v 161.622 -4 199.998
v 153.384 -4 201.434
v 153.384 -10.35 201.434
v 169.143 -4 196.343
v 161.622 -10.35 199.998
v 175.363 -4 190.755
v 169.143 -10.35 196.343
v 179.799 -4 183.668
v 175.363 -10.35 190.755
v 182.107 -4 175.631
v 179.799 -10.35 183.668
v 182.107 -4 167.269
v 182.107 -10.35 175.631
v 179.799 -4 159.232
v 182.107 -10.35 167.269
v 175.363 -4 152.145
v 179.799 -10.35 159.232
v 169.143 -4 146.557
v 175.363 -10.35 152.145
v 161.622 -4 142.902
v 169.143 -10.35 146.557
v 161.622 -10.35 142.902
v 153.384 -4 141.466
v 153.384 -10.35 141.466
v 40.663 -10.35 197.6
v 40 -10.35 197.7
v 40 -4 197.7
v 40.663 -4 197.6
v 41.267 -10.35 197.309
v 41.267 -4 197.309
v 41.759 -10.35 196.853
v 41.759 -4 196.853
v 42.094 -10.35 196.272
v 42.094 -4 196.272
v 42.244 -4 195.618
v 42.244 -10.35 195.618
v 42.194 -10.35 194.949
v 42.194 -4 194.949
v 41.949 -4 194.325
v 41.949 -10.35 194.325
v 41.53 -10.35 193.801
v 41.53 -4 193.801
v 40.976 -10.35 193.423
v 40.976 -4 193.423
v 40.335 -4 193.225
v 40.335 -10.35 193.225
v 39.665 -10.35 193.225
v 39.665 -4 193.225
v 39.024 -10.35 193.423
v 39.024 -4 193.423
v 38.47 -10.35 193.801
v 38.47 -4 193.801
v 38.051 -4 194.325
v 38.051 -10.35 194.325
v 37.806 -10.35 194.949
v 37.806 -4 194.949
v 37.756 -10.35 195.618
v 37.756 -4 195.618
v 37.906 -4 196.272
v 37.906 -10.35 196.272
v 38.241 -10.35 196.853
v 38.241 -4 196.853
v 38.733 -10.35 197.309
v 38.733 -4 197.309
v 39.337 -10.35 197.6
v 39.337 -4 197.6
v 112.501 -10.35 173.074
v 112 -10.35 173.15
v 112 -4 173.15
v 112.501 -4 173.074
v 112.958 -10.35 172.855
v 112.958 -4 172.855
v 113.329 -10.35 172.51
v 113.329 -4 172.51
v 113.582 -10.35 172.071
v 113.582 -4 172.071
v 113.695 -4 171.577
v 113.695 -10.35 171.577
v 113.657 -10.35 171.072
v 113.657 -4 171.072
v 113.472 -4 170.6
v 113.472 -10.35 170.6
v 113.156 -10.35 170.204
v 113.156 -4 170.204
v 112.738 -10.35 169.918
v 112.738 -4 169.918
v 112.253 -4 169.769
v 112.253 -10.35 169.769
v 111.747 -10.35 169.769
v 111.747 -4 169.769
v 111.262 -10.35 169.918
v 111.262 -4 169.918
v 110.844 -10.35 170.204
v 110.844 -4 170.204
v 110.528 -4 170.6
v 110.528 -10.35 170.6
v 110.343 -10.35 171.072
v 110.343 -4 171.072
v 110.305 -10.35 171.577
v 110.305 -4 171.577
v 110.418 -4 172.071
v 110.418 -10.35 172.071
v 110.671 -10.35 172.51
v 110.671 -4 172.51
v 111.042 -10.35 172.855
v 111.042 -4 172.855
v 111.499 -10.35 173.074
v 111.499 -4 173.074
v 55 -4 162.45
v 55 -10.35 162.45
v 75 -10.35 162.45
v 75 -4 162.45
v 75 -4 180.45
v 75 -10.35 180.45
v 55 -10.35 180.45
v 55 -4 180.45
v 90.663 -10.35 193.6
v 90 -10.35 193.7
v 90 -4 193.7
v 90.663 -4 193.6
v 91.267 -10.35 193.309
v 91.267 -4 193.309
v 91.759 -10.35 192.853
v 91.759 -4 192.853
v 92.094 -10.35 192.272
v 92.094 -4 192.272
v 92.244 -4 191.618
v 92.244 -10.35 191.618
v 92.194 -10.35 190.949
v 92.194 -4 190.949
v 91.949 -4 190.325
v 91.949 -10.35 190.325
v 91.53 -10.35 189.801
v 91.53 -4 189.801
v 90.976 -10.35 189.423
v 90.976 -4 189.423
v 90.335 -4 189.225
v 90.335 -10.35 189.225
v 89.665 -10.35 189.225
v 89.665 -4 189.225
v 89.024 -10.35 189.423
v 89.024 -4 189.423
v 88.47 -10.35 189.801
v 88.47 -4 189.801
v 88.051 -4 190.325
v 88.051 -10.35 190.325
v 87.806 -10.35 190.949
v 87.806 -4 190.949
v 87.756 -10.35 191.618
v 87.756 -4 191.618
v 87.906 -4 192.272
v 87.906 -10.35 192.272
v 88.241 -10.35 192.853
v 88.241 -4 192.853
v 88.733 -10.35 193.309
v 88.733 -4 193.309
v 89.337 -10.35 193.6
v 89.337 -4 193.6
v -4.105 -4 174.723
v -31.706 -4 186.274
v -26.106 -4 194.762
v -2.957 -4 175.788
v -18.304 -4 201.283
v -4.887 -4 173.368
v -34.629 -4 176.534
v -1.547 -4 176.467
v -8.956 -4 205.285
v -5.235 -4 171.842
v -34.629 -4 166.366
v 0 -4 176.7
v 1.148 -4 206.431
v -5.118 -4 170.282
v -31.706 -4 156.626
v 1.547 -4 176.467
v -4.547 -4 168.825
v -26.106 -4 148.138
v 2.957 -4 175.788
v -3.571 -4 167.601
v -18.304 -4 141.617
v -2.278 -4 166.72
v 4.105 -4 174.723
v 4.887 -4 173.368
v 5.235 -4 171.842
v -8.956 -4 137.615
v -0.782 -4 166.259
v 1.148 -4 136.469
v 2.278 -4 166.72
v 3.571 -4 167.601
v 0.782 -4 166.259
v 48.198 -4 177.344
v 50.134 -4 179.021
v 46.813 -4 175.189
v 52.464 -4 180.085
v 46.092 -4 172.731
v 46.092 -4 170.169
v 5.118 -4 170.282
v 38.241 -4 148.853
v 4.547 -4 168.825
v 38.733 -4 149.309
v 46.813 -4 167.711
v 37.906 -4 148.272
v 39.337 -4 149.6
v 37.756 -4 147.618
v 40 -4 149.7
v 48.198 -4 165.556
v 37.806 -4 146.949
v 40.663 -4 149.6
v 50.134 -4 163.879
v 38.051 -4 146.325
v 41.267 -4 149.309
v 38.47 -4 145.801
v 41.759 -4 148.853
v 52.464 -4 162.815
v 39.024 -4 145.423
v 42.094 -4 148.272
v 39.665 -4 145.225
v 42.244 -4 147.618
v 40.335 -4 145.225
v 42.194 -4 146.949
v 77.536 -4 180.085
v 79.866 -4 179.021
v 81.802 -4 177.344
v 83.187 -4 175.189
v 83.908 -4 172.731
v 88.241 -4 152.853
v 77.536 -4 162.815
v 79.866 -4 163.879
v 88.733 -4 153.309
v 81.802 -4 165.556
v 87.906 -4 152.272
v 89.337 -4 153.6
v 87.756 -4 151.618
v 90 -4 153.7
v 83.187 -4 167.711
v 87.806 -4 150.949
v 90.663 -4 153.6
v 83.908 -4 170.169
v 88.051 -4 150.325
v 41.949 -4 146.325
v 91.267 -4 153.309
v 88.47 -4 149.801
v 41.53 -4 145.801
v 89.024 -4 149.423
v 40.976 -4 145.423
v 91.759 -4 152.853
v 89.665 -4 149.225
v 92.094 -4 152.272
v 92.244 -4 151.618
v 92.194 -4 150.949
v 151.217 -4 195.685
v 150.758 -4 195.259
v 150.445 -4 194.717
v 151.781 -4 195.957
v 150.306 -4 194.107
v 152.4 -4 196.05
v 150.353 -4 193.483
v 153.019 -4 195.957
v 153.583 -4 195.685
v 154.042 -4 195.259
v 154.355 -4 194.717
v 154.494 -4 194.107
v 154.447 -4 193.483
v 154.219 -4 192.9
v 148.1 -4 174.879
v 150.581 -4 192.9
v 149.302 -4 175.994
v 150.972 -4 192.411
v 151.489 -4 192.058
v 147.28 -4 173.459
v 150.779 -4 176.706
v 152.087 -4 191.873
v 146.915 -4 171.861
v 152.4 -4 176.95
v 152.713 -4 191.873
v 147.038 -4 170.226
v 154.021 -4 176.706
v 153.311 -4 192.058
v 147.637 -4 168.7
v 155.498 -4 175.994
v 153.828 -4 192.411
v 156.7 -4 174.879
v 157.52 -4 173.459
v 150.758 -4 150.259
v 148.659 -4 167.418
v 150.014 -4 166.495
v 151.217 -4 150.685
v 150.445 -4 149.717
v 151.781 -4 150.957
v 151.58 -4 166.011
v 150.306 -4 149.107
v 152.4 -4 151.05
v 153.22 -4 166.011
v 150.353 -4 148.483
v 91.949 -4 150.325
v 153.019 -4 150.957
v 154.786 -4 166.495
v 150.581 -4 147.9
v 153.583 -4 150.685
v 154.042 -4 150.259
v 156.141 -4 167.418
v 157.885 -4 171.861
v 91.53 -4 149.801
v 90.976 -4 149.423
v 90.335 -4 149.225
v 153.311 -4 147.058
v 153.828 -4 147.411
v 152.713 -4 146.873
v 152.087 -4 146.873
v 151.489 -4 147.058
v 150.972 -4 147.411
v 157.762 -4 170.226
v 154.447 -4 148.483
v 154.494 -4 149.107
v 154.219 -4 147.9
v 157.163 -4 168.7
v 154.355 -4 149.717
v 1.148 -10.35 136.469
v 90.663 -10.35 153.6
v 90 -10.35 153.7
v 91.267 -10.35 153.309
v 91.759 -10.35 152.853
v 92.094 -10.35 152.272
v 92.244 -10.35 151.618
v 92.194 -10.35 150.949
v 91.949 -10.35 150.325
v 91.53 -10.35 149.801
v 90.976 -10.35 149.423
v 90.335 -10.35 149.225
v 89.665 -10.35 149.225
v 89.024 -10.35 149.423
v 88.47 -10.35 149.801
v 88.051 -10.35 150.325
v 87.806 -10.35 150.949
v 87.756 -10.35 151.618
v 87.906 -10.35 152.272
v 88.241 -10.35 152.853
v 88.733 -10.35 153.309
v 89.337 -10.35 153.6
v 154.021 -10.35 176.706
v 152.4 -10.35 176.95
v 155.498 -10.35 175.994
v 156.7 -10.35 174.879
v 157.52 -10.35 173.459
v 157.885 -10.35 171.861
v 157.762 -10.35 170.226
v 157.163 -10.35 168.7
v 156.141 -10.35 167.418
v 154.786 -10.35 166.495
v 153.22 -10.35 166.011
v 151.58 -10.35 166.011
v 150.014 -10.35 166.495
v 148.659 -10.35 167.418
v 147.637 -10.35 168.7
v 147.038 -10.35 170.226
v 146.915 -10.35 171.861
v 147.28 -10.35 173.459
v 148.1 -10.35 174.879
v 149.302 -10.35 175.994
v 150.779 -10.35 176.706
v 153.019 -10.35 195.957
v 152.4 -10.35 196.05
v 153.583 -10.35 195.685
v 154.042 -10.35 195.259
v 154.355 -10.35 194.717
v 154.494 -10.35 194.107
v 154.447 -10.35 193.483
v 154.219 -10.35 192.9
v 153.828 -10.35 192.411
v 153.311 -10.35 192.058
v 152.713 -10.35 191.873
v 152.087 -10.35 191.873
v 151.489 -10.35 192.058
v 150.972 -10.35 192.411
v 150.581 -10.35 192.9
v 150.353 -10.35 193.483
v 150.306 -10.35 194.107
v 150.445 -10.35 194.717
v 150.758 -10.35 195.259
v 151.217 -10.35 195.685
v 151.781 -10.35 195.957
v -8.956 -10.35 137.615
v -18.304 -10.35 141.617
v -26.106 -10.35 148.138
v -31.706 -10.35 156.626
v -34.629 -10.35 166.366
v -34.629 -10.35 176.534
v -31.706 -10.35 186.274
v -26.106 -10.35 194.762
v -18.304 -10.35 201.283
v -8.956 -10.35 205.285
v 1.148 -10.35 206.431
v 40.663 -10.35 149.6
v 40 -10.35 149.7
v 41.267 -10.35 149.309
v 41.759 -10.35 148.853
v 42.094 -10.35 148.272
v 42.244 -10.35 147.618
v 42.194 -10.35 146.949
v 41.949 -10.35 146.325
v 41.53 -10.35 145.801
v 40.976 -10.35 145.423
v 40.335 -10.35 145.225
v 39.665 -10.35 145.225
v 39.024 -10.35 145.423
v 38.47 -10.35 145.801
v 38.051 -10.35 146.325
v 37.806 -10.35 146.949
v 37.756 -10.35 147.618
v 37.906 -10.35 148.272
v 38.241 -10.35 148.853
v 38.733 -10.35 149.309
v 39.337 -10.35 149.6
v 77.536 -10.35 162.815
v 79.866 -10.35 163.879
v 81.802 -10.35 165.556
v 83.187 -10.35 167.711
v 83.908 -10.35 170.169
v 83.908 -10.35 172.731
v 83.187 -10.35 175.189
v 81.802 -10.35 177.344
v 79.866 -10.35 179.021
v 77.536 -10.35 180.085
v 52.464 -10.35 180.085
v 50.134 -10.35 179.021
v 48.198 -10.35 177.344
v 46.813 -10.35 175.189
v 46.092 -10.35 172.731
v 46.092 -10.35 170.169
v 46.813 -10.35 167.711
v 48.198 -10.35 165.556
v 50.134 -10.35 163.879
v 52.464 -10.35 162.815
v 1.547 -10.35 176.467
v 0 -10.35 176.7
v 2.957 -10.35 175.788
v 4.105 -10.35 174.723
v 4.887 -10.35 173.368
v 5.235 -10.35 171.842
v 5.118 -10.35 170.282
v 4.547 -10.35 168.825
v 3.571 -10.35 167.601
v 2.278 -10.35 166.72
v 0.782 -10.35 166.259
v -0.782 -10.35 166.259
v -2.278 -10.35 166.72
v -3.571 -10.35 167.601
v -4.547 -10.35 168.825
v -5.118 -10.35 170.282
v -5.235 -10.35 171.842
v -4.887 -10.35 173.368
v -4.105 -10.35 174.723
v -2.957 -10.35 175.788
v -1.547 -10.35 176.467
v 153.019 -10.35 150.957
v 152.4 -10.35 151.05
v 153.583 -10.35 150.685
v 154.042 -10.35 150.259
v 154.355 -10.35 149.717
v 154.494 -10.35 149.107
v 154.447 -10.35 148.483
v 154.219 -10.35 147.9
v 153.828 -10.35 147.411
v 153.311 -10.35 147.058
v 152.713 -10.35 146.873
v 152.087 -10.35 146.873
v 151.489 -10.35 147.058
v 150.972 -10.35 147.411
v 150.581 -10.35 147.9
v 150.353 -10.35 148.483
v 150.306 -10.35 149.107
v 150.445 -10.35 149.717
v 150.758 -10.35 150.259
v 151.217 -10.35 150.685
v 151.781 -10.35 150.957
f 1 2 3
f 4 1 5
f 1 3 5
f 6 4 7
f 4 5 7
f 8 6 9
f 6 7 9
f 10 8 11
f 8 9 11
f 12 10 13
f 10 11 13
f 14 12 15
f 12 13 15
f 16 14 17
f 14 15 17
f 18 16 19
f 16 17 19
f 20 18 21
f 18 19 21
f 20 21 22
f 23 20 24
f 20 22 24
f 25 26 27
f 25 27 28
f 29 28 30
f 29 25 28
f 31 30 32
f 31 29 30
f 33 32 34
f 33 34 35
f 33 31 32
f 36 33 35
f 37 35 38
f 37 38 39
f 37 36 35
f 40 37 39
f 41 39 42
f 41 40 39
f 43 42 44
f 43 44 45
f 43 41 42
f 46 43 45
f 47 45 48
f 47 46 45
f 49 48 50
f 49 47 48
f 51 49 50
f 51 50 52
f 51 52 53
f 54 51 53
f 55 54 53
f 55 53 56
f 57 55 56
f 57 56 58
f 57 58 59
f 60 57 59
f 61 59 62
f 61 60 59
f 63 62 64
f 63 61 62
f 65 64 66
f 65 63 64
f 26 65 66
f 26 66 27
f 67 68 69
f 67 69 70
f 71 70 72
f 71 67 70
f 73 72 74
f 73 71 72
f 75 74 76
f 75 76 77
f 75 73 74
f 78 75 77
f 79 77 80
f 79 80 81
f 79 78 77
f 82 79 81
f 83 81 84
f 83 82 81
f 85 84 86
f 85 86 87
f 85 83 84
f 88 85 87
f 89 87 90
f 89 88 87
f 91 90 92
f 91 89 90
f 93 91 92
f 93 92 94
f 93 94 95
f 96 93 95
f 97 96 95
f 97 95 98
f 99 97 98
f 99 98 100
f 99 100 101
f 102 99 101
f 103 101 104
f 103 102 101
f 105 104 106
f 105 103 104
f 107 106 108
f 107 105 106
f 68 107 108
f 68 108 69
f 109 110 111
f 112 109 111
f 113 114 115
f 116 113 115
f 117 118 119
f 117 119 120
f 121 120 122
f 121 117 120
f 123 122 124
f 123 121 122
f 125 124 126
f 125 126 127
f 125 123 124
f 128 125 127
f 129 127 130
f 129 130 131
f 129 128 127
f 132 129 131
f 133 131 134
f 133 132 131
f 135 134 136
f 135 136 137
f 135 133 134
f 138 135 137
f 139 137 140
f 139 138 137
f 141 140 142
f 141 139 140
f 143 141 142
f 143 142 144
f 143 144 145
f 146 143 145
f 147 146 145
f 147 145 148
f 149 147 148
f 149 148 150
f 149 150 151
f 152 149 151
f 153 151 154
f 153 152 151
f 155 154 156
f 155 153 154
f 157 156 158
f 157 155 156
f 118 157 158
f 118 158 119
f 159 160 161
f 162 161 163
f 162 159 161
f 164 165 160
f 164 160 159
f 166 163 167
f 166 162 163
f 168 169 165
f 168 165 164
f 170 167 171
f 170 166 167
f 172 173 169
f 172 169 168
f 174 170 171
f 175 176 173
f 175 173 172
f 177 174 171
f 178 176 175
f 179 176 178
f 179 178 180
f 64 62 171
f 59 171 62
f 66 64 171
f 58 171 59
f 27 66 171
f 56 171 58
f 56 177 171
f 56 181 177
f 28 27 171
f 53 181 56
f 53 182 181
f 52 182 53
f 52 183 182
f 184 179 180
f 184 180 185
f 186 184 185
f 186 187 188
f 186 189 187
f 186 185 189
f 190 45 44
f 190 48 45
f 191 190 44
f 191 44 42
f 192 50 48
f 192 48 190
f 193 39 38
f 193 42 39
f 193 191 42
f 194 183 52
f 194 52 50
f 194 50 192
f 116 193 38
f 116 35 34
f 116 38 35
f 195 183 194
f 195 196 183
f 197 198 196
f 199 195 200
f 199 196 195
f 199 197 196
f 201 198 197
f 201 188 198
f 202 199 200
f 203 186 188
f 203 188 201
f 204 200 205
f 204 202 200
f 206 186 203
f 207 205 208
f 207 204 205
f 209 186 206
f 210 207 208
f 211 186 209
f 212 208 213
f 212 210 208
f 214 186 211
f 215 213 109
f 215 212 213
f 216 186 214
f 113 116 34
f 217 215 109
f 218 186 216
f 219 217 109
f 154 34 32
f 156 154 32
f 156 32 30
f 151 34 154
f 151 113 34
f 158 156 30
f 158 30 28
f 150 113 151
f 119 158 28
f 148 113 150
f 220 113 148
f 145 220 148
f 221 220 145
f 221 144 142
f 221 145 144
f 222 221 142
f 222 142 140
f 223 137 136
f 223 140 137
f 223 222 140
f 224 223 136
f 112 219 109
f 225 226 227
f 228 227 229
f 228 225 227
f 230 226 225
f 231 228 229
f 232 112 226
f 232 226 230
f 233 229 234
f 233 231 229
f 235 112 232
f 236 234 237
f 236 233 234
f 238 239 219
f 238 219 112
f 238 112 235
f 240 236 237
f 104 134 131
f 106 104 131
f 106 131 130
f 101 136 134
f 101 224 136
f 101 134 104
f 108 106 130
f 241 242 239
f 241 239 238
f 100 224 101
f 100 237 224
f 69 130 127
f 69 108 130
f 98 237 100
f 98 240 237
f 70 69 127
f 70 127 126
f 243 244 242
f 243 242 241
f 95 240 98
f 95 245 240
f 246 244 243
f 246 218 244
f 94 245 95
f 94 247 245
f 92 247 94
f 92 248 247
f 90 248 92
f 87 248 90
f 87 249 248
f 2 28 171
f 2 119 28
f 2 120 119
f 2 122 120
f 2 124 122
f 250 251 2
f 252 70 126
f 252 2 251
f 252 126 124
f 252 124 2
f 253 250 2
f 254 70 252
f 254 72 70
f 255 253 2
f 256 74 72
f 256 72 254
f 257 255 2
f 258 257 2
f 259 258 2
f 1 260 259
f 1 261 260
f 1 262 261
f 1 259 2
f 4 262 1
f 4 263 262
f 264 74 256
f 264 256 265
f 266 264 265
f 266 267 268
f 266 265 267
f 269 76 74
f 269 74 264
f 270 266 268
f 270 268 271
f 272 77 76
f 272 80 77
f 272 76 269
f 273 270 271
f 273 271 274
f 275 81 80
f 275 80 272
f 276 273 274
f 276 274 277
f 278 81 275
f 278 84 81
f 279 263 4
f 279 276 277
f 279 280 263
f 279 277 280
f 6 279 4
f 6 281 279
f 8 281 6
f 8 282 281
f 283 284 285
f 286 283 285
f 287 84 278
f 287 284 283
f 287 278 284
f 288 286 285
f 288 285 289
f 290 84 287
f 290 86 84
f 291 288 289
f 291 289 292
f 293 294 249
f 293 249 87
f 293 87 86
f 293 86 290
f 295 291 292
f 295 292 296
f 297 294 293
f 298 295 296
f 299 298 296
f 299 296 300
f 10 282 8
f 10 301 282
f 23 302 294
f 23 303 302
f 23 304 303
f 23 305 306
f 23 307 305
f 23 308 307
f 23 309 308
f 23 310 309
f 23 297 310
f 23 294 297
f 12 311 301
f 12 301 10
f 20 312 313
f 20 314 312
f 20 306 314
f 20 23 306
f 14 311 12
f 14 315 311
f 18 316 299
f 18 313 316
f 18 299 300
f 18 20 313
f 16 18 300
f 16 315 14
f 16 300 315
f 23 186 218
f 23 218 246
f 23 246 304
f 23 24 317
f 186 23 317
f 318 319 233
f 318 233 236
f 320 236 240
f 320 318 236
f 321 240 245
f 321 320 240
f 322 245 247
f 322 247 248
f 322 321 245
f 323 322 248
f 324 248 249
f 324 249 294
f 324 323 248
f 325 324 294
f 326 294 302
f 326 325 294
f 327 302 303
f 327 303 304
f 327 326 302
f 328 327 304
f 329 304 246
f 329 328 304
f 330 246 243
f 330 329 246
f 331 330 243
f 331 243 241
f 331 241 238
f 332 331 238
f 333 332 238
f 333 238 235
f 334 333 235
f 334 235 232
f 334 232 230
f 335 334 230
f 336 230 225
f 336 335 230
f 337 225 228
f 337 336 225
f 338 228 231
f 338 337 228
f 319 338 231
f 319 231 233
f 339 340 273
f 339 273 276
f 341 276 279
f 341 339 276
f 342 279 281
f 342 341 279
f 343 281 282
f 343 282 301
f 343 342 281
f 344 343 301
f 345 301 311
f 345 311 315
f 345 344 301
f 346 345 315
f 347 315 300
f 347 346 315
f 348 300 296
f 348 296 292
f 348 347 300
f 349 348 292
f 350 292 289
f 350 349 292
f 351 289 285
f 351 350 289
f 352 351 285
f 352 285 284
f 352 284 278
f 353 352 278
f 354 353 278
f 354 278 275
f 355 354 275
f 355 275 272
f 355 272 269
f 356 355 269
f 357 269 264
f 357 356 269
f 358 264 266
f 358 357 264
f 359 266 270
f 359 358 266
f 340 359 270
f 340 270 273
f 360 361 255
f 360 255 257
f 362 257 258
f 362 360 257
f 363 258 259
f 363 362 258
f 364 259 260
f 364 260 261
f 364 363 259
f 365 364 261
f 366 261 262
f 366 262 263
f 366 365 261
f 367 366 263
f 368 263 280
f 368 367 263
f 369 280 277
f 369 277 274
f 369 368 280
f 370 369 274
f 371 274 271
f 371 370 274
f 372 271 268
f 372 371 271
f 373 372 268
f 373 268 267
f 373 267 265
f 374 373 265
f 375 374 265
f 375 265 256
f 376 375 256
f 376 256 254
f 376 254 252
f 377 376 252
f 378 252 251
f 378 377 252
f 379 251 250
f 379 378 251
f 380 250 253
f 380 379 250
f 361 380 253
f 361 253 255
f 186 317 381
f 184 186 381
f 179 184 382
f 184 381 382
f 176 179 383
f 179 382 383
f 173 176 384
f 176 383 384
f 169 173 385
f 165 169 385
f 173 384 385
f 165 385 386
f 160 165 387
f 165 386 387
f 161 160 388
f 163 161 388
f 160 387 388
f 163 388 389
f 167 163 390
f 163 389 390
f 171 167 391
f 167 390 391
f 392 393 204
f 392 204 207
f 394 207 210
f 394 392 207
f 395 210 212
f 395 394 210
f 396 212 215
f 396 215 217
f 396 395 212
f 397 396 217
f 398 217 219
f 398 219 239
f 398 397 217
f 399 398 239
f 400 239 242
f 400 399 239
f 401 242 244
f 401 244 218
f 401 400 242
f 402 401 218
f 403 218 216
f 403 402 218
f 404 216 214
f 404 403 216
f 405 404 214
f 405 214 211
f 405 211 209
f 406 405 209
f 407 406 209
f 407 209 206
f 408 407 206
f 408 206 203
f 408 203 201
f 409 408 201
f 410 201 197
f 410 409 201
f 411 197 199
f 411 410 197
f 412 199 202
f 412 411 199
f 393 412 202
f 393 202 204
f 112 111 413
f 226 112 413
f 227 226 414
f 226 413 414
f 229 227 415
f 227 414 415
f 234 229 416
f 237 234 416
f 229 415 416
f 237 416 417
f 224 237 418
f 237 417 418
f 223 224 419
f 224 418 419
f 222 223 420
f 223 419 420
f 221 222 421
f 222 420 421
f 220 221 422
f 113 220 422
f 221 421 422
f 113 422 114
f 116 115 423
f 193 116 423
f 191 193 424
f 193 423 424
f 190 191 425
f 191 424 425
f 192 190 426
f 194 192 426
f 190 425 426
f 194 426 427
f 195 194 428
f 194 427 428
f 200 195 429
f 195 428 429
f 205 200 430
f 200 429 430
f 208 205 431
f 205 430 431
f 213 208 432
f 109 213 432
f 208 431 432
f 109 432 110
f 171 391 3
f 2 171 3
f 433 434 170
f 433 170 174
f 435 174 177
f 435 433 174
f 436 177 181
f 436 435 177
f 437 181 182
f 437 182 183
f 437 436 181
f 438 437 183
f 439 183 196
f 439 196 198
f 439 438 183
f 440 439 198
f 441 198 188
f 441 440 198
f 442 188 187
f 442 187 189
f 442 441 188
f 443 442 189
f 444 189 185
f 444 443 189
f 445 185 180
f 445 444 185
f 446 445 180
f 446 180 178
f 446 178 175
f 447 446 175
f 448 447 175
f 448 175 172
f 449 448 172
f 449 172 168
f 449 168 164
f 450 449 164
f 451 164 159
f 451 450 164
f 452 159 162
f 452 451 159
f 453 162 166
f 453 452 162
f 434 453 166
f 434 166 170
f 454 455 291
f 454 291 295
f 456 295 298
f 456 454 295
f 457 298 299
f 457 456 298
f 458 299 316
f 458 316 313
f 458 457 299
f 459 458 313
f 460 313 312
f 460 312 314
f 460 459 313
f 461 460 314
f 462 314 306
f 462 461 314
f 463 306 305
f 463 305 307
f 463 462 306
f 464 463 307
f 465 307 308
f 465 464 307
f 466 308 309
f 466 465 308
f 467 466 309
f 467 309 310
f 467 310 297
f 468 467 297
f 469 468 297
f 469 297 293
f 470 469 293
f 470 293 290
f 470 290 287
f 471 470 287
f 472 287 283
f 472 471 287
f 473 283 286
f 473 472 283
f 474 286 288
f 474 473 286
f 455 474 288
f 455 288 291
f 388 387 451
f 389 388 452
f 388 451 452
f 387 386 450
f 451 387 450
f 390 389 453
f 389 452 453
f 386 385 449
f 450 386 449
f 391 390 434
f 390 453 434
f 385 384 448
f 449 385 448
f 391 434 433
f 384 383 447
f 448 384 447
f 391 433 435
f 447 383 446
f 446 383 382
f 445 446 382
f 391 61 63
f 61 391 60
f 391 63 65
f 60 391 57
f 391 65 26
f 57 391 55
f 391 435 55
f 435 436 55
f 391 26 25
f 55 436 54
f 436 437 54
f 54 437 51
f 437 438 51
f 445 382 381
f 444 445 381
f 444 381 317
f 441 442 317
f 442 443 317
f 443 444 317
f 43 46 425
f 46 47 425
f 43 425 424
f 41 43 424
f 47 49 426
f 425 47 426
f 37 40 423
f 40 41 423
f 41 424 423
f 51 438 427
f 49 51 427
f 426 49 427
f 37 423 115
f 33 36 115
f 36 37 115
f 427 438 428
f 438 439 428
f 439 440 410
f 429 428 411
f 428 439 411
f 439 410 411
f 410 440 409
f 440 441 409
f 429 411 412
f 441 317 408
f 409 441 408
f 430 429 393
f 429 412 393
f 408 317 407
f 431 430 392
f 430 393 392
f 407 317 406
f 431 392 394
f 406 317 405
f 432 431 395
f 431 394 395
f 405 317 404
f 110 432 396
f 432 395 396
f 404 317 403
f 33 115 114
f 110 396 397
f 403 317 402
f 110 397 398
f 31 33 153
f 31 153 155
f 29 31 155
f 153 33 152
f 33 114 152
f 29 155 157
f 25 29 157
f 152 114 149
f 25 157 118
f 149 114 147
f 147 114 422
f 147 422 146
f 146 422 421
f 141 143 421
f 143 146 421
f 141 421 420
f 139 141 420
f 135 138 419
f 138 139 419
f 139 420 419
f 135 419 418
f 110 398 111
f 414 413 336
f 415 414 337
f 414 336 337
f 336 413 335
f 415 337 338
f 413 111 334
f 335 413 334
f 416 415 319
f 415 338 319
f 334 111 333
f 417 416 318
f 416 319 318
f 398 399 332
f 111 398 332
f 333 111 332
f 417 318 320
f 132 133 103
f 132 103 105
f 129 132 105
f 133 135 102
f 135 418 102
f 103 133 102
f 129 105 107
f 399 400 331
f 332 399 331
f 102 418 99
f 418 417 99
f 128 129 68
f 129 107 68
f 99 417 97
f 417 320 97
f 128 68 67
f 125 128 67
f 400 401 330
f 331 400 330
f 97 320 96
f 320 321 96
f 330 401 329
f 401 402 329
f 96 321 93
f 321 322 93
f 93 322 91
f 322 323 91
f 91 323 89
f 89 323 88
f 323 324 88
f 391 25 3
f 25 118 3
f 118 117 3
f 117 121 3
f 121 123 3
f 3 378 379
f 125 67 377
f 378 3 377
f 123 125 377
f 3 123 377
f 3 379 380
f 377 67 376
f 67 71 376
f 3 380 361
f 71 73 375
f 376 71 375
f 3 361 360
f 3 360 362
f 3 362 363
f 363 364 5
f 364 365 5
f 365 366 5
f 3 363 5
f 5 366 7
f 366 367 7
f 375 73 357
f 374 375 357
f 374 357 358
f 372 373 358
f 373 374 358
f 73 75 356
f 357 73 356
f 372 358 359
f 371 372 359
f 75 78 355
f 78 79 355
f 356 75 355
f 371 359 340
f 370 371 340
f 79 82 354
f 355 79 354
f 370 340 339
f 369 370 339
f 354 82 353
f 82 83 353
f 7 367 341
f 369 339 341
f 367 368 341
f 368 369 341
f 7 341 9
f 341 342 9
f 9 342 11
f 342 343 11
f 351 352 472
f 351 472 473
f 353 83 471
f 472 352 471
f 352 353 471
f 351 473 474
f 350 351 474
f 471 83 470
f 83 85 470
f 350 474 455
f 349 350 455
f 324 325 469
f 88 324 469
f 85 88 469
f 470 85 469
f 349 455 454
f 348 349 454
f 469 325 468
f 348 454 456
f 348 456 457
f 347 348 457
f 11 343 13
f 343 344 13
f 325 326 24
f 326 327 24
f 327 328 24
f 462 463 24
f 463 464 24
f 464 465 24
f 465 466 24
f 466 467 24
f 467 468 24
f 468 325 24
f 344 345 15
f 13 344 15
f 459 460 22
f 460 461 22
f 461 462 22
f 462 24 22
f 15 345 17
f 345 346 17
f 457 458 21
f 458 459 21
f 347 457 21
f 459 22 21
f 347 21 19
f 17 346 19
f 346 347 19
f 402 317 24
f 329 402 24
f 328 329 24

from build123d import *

# Parameters (mm, degrees)
PLACA_START                         = -10.35
PLACA_DEPTH                         = 6.35
PLACA_R1_START                      = -10.35
CROQUIS2_R                          = 35
PLACA_R1_DEPTH                      = 6.35
PLACA_R2_START                      = -10.35
CROQUIS3_R                          = 30
PLACA_R2_DEPTH                      = 6.35
ALIGERADO_START                     = -10.35
ALIGERADO_DEPTH                     = 6.35
BARRENOS_SEPARADORES_M4_START       = -10.35
CROQUIS5_R                          = 2.25
BARRENOS_SEPARADORES_M4_DEPTH       = 6.35
PASO_PERNOS_Y_ROSCA_M5_KFL000_START = -10.35
CROQUIS6_R                          = 5.25
CROQUIS6_R_2                        = 5.5
CROQUIS6_R_3                        = 2.1
PASO_PERNOS_Y_ROSCA_M5_KFL000_DEPTH = 6.35
ROSCA_M3_BASES_CINCHO_START         = -10.35
CROQUIS7_R                          = 1.25
ROSCA_M3_BASES_CINCHO_DEPTH         = 6.35
PASO_M3_BASES_CINCHO_START          = -10.35
CROQUIS8_R                          = 1.7
PASO_M3_BASES_CINCHO_DEPTH          = 6.35


with BuildPart() as part:
    # Croquis1 → Placa (new body)
    with BuildSketch(Plane(origin=(0, 0, 0), x_dir=(1, 0, 0), z_dir=(0, 1, 0)).offset(PLACA_START)):
        Polygon((1.148293963, -206.431158085), (153.384251969, -201.433849787), (153.384251969, -141.466150213), (1.148293963, -136.468841915), align=None)
    extrude(amount=PLACA_DEPTH)

    # Croquis2 → Placa_r1 (add)
    with BuildSketch(Plane(origin=(0, 0, 0), x_dir=(1, 0, 0), z_dir=(0, 1, 0)).offset(PLACA_R1_START)):
        with Locations((0, -171.45)):
            Circle(CROQUIS2_R)
    extrude(amount=PLACA_R1_DEPTH)

    # Croquis3 → Placa_r2 (add)
    with BuildSketch(Plane(origin=(0, 0, 0), x_dir=(1, 0, 0), z_dir=(0, 1, 0)).offset(PLACA_R2_START)):
        with Locations((152.4, -171.45)):
            Circle(CROQUIS3_R)
    extrude(amount=PLACA_R2_DEPTH)

    # Croquis4 → Aligerado (cut)
    with BuildSketch(Plane(origin=(0, 0, 0), x_dir=(1, 0, 0), z_dir=(0, 1, 0)).offset(ALIGERADO_START)):
        with BuildLine():
            Line((55, -162.45), (75, -162.45))
            ThreePointArc((75, -162.45), (84, -171.45), (75, -180.45))
            Line((75, -180.45), (55, -180.45))
            ThreePointArc((55, -180.45), (46, -171.45), (55, -162.45))
        make_face()
    extrude(amount=ALIGERADO_DEPTH, mode=Mode.SUBTRACT)

    # Croquis5 → Barrenos_separadores_M4 (cut)
    with BuildSketch(Plane(origin=(0, 0, 0), x_dir=(1, 0, 0), z_dir=(0, 1, 0)).offset(BARRENOS_SEPARADORES_M4_START)):
        with Locations(Location((40, -195.45, 0), (0, 0, 270))):
            Circle(CROQUIS5_R)
        with Locations(Location((40, -147.45, 0), (0, 0, 270))):
            Circle(CROQUIS5_R)
        with Locations(Location((90, -191.45, 0), (0, 0, 270))):
            Circle(CROQUIS5_R)
        with Locations(Location((90, -151.45, 0), (0, 0, 270))):
            Circle(CROQUIS5_R)
    extrude(amount=BARRENOS_SEPARADORES_M4_DEPTH, mode=Mode.SUBTRACT)

    # Croquis6 → Paso_pernos_y_rosca_M5_KFL000 (cut)
    with BuildSketch(Plane(origin=(0, 0, 0), x_dir=(1, 0, 0), z_dir=(0, 1, 0)).offset(PASO_PERNOS_Y_ROSCA_M5_KFL000_START)):
        with Locations(Location((0, -171.45, 0), (0, 0, 270))):
            Circle(CROQUIS6_R)
        with Locations(Location((152.4, -171.45, 0), (0, 0, 270))):
            Circle(CROQUIS6_R_2)
        with Locations(Location((152.4, -193.95, 0), (0, 0, 270))):
            Circle(CROQUIS6_R_3)
        with Locations(Location((152.4, -148.95, 0), (0, 0, 270))):
            Circle(CROQUIS6_R_3)
    extrude(amount=PASO_PERNOS_Y_ROSCA_M5_KFL000_DEPTH, mode=Mode.SUBTRACT)

    # Croquis7 → Rosca_M3_bases_cincho (cut)
    with BuildSketch(Plane(origin=(0, 0, 0), x_dir=(1, 0, 0), z_dir=(0, 1, 0)).offset(ROSCA_M3_BASES_CINCHO_START)):
        with Locations(Location((112, -171.45, 0), (0, 0, 270))):
            Circle(CROQUIS7_R)
    extrude(amount=ROSCA_M3_BASES_CINCHO_DEPTH, mode=Mode.SUBTRACT)

    # Croquis8 → Paso_M3_bases_cincho (cut)
    with BuildSketch(Plane(origin=(0, 0, 0), x_dir=(1, 0, 0), z_dir=(0, 1, 0)).offset(PASO_M3_BASES_CINCHO_START)):
        with Locations(Location((112, -171.45, 0), (0, 0, 270))):
            Circle(CROQUIS8_R)
    extrude(amount=PASO_M3_BASES_CINCHO_DEPTH, mode=Mode.SUBTRACT)


solid = part.part
